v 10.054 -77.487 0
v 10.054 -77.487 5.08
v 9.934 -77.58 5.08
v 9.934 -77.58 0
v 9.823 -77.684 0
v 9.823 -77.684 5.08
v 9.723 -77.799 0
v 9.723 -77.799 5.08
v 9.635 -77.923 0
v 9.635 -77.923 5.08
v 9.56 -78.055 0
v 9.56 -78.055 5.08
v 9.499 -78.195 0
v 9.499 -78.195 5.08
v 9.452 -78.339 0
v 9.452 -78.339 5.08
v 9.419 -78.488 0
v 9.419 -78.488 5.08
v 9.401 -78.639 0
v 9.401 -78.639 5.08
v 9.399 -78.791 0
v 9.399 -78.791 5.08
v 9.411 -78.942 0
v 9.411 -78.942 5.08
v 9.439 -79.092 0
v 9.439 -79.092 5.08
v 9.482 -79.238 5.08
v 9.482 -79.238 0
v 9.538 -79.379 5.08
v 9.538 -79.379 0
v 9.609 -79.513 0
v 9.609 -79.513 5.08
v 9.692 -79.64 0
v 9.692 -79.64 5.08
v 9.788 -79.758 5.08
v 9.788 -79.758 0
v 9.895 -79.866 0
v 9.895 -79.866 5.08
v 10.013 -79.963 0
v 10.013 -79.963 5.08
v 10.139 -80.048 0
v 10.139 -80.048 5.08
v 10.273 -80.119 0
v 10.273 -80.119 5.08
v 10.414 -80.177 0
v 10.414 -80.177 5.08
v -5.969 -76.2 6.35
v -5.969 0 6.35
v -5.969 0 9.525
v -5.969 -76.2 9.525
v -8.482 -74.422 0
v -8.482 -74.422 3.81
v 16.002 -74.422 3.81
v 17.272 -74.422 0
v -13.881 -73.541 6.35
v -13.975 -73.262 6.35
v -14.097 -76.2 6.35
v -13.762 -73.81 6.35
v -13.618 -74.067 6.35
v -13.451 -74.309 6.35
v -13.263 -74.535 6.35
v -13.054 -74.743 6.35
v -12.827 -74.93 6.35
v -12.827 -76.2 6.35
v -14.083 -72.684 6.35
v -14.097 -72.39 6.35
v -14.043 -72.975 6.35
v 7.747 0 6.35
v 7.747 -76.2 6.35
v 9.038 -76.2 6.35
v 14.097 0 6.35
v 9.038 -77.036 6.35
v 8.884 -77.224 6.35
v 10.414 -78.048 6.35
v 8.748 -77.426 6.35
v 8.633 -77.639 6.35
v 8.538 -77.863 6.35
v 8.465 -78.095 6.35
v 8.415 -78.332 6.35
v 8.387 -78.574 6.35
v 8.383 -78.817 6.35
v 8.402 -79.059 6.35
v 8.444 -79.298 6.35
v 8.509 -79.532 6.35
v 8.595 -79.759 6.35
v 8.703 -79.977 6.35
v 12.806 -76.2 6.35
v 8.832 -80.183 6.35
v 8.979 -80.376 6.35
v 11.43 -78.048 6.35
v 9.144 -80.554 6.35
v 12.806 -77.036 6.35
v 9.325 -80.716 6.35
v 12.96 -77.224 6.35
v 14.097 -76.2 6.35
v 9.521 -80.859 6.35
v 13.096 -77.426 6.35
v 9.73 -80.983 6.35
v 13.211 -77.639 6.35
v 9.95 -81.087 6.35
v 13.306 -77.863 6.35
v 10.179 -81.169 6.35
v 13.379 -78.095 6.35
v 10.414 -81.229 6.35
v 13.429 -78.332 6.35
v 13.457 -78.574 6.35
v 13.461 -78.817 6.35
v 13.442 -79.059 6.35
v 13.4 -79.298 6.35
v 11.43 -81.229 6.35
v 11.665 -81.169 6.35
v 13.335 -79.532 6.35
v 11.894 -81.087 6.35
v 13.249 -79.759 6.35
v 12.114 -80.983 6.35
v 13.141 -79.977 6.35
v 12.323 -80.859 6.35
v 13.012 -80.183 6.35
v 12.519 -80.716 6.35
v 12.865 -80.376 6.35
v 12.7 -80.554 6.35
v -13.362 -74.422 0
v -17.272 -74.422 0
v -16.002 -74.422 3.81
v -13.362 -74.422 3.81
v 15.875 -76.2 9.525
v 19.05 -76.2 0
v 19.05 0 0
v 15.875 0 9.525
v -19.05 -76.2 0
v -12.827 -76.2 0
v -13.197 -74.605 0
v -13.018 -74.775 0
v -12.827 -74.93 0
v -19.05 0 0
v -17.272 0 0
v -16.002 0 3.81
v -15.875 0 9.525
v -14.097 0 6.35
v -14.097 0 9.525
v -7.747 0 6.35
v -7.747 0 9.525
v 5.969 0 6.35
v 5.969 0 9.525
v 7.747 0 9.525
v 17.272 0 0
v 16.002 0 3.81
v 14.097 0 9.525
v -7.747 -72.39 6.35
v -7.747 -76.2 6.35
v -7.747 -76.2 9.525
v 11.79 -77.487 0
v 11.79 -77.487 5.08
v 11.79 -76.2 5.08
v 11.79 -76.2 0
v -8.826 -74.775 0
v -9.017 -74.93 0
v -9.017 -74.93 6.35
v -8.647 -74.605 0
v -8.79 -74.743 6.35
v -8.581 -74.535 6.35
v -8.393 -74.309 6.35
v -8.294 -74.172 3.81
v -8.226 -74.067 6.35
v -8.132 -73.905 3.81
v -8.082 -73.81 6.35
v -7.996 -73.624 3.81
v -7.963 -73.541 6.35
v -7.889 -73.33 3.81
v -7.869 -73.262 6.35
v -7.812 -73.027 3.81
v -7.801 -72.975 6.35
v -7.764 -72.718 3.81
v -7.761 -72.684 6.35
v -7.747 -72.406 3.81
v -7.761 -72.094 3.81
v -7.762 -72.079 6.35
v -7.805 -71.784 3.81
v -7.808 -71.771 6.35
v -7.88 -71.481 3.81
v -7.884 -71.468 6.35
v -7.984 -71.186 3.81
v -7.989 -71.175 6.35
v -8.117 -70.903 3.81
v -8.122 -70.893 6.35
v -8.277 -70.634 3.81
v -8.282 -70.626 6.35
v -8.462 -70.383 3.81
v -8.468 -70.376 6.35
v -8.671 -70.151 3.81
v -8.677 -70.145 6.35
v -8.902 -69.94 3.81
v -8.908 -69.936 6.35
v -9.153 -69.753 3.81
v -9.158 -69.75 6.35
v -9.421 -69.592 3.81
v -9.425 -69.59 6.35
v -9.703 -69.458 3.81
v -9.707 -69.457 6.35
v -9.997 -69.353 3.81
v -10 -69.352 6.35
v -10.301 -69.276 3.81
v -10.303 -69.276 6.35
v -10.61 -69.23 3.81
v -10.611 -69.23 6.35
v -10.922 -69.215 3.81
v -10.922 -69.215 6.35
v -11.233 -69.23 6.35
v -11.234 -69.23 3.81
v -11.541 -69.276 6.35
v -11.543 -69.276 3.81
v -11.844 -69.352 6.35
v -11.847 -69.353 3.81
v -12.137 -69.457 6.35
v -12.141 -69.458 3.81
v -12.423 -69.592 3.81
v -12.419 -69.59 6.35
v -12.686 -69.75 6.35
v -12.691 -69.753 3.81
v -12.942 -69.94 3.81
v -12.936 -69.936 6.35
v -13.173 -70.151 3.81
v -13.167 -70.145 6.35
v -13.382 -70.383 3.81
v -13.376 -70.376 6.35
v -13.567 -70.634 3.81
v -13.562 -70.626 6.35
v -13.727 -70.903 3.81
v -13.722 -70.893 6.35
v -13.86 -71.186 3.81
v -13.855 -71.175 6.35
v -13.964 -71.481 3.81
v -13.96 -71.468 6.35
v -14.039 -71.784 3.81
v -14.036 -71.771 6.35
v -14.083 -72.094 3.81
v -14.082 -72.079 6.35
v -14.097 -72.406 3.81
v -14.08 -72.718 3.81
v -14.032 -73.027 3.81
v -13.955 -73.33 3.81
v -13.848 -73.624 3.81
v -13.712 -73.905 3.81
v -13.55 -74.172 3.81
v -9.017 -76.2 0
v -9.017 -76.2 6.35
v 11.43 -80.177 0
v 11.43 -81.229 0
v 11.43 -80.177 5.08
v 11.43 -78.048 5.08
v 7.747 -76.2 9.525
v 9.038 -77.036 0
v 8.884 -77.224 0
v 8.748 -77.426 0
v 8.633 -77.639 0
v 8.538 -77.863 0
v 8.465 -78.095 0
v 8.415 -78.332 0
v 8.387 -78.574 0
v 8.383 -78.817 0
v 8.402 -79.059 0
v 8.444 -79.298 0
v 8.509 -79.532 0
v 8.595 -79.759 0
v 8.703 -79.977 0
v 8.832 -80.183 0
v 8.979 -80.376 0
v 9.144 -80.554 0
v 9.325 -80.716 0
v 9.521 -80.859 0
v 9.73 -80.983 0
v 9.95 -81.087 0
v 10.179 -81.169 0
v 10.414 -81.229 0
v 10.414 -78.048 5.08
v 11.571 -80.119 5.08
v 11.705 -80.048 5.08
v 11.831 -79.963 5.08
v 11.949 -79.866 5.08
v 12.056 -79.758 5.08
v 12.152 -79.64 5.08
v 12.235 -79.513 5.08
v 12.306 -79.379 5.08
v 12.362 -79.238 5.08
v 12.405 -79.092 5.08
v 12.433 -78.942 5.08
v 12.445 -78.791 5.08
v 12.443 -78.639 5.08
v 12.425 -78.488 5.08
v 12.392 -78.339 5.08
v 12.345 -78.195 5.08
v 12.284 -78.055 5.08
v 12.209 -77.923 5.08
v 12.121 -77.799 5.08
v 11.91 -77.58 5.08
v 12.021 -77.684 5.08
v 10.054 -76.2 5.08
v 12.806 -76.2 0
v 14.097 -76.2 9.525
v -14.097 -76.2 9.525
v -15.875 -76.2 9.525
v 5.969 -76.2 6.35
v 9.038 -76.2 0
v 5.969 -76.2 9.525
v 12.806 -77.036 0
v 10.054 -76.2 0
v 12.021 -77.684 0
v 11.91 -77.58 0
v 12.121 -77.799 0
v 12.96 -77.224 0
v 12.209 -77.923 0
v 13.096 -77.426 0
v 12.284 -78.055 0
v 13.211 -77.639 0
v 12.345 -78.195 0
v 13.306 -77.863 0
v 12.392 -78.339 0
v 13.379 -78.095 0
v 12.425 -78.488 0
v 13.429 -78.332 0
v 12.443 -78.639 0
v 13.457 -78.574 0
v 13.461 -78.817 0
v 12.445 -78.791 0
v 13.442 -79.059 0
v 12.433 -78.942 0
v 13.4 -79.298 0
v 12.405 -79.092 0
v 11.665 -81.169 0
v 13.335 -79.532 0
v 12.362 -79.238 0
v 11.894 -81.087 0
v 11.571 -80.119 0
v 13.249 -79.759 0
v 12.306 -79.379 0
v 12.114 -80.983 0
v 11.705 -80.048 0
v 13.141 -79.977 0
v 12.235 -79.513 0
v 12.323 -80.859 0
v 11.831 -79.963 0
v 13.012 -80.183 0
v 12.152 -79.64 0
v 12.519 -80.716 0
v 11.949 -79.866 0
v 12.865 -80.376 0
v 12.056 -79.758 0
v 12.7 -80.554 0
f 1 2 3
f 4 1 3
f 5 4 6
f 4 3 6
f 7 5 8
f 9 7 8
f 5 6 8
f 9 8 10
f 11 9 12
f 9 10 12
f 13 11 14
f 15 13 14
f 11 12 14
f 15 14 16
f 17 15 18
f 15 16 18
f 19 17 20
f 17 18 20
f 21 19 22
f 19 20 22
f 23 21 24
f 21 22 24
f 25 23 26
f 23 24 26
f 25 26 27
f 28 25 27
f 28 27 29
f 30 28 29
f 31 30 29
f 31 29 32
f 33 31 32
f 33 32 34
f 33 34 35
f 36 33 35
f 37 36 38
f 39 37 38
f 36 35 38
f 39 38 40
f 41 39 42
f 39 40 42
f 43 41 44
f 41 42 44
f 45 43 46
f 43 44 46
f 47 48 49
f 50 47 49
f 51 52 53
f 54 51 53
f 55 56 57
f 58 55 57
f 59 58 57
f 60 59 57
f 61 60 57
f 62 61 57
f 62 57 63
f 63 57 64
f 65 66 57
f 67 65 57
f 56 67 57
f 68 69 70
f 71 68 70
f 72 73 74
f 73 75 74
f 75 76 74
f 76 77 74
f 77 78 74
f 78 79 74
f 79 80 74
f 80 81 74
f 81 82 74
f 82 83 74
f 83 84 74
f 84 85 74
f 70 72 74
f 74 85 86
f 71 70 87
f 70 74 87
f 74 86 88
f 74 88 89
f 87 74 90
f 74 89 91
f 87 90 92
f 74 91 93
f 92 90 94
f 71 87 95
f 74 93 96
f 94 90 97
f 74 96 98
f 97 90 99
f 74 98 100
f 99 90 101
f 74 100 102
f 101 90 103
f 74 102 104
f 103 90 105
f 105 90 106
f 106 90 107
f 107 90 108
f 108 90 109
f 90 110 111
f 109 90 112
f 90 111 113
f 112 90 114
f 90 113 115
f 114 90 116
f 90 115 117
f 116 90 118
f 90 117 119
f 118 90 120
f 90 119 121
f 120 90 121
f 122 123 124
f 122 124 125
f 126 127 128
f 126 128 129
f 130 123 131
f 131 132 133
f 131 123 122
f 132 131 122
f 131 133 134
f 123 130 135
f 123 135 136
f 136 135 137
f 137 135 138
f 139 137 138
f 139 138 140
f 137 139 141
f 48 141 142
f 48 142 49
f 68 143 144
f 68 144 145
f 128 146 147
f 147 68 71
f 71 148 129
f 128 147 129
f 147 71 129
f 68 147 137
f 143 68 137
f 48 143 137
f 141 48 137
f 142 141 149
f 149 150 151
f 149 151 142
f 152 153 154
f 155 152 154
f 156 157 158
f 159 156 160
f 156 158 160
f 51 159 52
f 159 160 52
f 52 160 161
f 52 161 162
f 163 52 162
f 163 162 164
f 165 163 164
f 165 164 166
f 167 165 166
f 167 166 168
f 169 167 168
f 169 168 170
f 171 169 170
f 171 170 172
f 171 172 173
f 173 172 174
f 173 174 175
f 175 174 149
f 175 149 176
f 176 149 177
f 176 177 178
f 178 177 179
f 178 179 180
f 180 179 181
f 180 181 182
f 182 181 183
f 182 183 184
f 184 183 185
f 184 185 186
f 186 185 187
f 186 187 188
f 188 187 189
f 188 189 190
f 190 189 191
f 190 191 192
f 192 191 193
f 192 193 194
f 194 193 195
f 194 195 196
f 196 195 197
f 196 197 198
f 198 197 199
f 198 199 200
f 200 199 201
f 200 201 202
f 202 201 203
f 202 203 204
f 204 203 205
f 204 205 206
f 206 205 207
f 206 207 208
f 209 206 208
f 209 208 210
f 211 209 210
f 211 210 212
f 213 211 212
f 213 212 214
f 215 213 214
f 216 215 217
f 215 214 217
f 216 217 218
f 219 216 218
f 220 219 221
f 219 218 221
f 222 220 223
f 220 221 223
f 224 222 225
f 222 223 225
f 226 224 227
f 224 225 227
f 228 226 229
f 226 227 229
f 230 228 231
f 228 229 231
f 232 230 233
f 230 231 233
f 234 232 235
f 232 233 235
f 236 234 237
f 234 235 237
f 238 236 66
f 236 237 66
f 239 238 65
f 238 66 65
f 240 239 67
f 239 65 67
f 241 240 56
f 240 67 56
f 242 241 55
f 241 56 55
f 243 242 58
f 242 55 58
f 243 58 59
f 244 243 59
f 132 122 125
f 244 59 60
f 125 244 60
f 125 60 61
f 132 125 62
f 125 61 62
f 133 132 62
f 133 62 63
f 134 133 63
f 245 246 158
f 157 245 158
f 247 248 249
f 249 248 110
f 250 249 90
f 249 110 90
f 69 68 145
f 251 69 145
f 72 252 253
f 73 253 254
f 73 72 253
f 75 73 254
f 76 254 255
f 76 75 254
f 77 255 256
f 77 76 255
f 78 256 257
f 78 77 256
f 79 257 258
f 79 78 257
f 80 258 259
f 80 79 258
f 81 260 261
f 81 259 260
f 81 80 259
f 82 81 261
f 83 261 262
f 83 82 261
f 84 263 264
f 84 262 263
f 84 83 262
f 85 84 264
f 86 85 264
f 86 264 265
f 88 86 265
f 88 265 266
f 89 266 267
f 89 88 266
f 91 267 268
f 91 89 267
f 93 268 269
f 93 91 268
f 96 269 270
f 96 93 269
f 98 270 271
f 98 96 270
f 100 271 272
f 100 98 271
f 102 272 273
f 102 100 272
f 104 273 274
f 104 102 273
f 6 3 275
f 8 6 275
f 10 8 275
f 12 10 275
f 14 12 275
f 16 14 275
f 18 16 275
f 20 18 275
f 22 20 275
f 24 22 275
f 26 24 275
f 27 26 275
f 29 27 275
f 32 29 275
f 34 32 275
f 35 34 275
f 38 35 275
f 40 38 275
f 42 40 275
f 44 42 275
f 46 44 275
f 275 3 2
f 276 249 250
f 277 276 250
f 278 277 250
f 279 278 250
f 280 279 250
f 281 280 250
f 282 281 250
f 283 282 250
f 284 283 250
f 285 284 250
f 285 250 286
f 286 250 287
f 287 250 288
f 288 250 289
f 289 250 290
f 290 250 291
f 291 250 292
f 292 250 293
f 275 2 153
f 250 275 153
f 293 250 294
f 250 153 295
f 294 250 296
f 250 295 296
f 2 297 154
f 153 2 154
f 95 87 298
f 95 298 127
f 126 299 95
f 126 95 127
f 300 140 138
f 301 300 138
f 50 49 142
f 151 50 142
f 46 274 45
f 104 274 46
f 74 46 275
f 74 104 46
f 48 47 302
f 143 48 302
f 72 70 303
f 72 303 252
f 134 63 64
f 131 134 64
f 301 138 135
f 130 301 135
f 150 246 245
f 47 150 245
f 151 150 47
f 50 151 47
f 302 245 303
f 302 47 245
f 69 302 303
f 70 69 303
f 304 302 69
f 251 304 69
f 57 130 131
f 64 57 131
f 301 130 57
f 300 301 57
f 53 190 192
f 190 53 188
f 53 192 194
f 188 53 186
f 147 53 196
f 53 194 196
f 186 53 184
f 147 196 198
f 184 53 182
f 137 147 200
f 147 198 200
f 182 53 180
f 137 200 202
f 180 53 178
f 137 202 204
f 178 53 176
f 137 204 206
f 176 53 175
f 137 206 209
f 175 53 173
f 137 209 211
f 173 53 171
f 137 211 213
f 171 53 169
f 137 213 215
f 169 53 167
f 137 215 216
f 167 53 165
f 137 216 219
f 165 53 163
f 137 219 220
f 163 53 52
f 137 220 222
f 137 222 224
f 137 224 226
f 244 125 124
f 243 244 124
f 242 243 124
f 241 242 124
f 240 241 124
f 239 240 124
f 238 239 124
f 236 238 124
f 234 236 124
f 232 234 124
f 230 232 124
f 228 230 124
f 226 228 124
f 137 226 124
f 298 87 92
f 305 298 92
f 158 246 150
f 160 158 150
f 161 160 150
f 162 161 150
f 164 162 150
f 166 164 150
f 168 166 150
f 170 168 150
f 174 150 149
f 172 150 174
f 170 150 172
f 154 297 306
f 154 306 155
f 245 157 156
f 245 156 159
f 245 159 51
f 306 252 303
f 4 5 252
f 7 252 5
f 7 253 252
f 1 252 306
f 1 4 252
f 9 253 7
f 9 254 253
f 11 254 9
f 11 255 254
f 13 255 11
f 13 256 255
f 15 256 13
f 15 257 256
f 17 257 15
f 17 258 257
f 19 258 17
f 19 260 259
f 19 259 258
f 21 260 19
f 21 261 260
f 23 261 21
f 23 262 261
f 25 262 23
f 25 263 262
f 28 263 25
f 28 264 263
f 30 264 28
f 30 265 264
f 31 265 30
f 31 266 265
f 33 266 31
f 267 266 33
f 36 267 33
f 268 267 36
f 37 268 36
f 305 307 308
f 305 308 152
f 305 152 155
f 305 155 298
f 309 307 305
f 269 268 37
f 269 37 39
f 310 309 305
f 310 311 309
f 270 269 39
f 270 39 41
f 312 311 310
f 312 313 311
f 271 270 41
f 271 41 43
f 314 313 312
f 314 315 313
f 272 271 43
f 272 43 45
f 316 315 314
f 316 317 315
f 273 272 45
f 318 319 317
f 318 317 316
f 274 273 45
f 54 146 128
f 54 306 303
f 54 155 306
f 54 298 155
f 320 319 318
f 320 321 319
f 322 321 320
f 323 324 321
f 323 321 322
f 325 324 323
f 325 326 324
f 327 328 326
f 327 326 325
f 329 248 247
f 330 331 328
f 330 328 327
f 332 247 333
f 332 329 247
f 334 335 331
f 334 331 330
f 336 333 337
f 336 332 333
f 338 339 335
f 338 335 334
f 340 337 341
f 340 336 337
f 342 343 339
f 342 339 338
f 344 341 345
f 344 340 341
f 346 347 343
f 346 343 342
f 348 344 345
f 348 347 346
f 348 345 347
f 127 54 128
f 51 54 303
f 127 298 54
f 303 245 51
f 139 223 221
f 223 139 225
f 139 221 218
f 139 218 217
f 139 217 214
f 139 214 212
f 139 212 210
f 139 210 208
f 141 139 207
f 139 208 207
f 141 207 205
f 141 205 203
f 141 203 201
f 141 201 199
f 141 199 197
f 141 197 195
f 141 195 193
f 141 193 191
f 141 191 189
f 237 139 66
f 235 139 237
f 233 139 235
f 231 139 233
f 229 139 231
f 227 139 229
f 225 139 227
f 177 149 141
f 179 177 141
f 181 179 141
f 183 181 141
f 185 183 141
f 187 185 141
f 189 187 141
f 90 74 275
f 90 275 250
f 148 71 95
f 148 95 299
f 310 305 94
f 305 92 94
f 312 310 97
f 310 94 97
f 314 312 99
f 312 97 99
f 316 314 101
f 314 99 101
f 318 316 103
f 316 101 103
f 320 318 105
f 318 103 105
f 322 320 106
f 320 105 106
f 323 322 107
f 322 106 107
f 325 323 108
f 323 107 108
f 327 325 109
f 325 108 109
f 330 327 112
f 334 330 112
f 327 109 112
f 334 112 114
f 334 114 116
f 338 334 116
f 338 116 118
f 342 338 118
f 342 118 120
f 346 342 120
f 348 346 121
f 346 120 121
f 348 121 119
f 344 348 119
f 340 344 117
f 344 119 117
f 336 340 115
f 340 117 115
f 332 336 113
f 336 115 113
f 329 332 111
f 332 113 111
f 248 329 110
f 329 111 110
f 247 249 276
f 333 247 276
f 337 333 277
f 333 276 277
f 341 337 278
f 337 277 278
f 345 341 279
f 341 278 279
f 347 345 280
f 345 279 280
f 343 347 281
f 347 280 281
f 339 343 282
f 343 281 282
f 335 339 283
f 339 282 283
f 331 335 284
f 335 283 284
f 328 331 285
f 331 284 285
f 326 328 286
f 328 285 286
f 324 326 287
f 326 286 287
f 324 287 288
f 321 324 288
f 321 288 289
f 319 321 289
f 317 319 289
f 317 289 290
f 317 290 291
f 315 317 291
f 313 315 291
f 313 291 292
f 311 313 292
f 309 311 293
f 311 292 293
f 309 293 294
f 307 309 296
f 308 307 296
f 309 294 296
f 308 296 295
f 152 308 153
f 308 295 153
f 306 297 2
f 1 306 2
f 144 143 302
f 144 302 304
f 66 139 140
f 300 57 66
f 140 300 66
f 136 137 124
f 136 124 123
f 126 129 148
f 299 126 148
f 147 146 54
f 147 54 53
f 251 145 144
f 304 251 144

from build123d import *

# Parameters (mm, degrees)
F1_DEPTH  = 76.2
F2_W      = 6.35
F2_H      = 3.175
F2_W_2    = 11.938
F3_DEPTH  = 76.201
F5_DEPTH  = 1.778
F7_DEPTH  = 3.81
F9_DEPTH  = 6.351
F11_DEPTH = 1.27
F13_DEPTH = 5.08


with BuildPart() as f1:
    # F0 (on Front) → F1 (new body)
    with BuildSketch(Plane.XZ):
        Polygon((-15.875, 9.525), (-19.05, 0), (19.05, 0), (15.875, 9.525), align=None)
    extrude(amount=F1_DEPTH)

    # F2 (on face) → F3 (cut, through all)
    with BuildSketch(Plane.XZ.offset(76.2)):
        with Locations((10.922, 7.9375)):
            Rectangle(F2_W, F2_H)
        with Locations((0, 7.9375)):
            Rectangle(F2_W_2, F2_H)
        with Locations((-10.922, 7.9375)):
            Rectangle(F2_W, F2_H)
        Polygon((-16.002, 3.81), (-17.272, 0), (17.272, 0), (16.002, 3.81), align=None)
    extrude(amount=-F3_DEPTH, mode=Mode.SUBTRACT)

    # F4 (on face) → F5 (join)
    with BuildSketch(Plane.XZ.offset(76.2)):
        Polygon((-15.875, 9.525), (-19.05, 0), (19.05, 0), (15.875, 9.525), (14.097, 9.525), (14.097, 6.35), (7.747, 6.35), (7.747, 9.525), (5.969, 9.525), (5.969, 6.35), (-5.969, 6.35), (-5.969, 9.525), (-7.747, 9.525), (-7.747, 6.35), (-14.097, 6.35), (-14.097, 9.525), align=None)
    extrude(amount=-F5_DEPTH)

    # F6 (on face) → F7 (join, through all)
    with BuildSketch(Plane(origin=(0, 0, 3.81), x_dir=(1, 0, 0), z_dir=(0, 0, -1))):
        with BuildLine():
            Line((-8.48241, 74.422), (-13.36159, 74.422))
            ThreePointArc((-13.36159, 74.422), (-10.922, 69.215), (-8.48241, 74.422))
        make_face()
    extrude(amount=F7_DEPTH)

    # F8 (on face) → F9 (cut, through all)
    with BuildSketch(Plane.XY.offset(6.35)):
        with BuildLine():
            Line((-9.017, -76.2), (-9.017, -74.93))
            ThreePointArc((-9.017, -74.93), (-10.922, -69.215), (-12.827, -74.93))
            Line((-12.827, -74.93), (-12.827, -76.2))
            Line((-12.827, -76.2), (-9.017, -76.2))
        make_face()
    extrude(amount=-F9_DEPTH, mode=Mode.SUBTRACT)

    # F10 (on face) → F11 (join)
    with BuildSketch(Plane.XY.offset(6.35)):
        with BuildLine():
            Line((9.038063, -76.2), (9.038063, -77.036362))
            ThreePointArc((9.038063, -77.036362), (8.508657, -79.532069), (10.414, -81.228682))
            Line((10.414, -81.228682), (10.414, -78.047838))
            Line((10.414, -78.047838), (11.43, -78.047838))
            Line((11.43, -78.047838), (11.43, -81.228682))
            ThreePointArc((11.43, -81.228682), (13.335343, -79.532069), (12.805937, -77.036362))
            Line((12.805937, -77.036362), (12.805937, -76.2))
            Line((12.805937, -76.2), (9.038063, -76.2))
        make_face()
    extrude(amount=-F11_DEPTH)

    # F12 (on face) → F13 (join, through all)
    with BuildSketch(Plane(origin=(0, 0, 5.08), x_dir=(1, 0, 0), z_dir=(0, 0, -1))):
        with BuildLine():
            Line((12.805937, 76.2), (12.805937, 77.036362))
            ThreePointArc((12.805937, 77.036362), (13.335343, 79.532069), (11.43, 81.228682))
            Line((11.43, 81.228682), (11.43, 80.176841))
            ThreePointArc((11.43, 80.176841), (12.432533, 78.942152), (11.789937, 77.487298))
            Line((11.789937, 77.487298), (11.789937, 76.2))
            Line((11.789937, 76.2), (12.805937, 76.2))
        make_face()
        with BuildLine():
            ThreePointArc((10.414, 81.228682), (8.508657, 79.532069), (9.038063, 77.036362))
            Line((9.038063, 77.036362), (9.038063, 76.2))
            Line((9.038063, 76.2), (10.054063, 76.2))
            Line((10.054063, 76.2), (10.054063, 77.487298))
            ThreePointArc((10.054063, 77.487298), (9.411467, 78.942152), (10.414, 80.176841))
            Line((10.414, 80.176841), (10.414, 81.228682))
        make_face()
    extrude(amount=F13_DEPTH)


solid = f1.part
